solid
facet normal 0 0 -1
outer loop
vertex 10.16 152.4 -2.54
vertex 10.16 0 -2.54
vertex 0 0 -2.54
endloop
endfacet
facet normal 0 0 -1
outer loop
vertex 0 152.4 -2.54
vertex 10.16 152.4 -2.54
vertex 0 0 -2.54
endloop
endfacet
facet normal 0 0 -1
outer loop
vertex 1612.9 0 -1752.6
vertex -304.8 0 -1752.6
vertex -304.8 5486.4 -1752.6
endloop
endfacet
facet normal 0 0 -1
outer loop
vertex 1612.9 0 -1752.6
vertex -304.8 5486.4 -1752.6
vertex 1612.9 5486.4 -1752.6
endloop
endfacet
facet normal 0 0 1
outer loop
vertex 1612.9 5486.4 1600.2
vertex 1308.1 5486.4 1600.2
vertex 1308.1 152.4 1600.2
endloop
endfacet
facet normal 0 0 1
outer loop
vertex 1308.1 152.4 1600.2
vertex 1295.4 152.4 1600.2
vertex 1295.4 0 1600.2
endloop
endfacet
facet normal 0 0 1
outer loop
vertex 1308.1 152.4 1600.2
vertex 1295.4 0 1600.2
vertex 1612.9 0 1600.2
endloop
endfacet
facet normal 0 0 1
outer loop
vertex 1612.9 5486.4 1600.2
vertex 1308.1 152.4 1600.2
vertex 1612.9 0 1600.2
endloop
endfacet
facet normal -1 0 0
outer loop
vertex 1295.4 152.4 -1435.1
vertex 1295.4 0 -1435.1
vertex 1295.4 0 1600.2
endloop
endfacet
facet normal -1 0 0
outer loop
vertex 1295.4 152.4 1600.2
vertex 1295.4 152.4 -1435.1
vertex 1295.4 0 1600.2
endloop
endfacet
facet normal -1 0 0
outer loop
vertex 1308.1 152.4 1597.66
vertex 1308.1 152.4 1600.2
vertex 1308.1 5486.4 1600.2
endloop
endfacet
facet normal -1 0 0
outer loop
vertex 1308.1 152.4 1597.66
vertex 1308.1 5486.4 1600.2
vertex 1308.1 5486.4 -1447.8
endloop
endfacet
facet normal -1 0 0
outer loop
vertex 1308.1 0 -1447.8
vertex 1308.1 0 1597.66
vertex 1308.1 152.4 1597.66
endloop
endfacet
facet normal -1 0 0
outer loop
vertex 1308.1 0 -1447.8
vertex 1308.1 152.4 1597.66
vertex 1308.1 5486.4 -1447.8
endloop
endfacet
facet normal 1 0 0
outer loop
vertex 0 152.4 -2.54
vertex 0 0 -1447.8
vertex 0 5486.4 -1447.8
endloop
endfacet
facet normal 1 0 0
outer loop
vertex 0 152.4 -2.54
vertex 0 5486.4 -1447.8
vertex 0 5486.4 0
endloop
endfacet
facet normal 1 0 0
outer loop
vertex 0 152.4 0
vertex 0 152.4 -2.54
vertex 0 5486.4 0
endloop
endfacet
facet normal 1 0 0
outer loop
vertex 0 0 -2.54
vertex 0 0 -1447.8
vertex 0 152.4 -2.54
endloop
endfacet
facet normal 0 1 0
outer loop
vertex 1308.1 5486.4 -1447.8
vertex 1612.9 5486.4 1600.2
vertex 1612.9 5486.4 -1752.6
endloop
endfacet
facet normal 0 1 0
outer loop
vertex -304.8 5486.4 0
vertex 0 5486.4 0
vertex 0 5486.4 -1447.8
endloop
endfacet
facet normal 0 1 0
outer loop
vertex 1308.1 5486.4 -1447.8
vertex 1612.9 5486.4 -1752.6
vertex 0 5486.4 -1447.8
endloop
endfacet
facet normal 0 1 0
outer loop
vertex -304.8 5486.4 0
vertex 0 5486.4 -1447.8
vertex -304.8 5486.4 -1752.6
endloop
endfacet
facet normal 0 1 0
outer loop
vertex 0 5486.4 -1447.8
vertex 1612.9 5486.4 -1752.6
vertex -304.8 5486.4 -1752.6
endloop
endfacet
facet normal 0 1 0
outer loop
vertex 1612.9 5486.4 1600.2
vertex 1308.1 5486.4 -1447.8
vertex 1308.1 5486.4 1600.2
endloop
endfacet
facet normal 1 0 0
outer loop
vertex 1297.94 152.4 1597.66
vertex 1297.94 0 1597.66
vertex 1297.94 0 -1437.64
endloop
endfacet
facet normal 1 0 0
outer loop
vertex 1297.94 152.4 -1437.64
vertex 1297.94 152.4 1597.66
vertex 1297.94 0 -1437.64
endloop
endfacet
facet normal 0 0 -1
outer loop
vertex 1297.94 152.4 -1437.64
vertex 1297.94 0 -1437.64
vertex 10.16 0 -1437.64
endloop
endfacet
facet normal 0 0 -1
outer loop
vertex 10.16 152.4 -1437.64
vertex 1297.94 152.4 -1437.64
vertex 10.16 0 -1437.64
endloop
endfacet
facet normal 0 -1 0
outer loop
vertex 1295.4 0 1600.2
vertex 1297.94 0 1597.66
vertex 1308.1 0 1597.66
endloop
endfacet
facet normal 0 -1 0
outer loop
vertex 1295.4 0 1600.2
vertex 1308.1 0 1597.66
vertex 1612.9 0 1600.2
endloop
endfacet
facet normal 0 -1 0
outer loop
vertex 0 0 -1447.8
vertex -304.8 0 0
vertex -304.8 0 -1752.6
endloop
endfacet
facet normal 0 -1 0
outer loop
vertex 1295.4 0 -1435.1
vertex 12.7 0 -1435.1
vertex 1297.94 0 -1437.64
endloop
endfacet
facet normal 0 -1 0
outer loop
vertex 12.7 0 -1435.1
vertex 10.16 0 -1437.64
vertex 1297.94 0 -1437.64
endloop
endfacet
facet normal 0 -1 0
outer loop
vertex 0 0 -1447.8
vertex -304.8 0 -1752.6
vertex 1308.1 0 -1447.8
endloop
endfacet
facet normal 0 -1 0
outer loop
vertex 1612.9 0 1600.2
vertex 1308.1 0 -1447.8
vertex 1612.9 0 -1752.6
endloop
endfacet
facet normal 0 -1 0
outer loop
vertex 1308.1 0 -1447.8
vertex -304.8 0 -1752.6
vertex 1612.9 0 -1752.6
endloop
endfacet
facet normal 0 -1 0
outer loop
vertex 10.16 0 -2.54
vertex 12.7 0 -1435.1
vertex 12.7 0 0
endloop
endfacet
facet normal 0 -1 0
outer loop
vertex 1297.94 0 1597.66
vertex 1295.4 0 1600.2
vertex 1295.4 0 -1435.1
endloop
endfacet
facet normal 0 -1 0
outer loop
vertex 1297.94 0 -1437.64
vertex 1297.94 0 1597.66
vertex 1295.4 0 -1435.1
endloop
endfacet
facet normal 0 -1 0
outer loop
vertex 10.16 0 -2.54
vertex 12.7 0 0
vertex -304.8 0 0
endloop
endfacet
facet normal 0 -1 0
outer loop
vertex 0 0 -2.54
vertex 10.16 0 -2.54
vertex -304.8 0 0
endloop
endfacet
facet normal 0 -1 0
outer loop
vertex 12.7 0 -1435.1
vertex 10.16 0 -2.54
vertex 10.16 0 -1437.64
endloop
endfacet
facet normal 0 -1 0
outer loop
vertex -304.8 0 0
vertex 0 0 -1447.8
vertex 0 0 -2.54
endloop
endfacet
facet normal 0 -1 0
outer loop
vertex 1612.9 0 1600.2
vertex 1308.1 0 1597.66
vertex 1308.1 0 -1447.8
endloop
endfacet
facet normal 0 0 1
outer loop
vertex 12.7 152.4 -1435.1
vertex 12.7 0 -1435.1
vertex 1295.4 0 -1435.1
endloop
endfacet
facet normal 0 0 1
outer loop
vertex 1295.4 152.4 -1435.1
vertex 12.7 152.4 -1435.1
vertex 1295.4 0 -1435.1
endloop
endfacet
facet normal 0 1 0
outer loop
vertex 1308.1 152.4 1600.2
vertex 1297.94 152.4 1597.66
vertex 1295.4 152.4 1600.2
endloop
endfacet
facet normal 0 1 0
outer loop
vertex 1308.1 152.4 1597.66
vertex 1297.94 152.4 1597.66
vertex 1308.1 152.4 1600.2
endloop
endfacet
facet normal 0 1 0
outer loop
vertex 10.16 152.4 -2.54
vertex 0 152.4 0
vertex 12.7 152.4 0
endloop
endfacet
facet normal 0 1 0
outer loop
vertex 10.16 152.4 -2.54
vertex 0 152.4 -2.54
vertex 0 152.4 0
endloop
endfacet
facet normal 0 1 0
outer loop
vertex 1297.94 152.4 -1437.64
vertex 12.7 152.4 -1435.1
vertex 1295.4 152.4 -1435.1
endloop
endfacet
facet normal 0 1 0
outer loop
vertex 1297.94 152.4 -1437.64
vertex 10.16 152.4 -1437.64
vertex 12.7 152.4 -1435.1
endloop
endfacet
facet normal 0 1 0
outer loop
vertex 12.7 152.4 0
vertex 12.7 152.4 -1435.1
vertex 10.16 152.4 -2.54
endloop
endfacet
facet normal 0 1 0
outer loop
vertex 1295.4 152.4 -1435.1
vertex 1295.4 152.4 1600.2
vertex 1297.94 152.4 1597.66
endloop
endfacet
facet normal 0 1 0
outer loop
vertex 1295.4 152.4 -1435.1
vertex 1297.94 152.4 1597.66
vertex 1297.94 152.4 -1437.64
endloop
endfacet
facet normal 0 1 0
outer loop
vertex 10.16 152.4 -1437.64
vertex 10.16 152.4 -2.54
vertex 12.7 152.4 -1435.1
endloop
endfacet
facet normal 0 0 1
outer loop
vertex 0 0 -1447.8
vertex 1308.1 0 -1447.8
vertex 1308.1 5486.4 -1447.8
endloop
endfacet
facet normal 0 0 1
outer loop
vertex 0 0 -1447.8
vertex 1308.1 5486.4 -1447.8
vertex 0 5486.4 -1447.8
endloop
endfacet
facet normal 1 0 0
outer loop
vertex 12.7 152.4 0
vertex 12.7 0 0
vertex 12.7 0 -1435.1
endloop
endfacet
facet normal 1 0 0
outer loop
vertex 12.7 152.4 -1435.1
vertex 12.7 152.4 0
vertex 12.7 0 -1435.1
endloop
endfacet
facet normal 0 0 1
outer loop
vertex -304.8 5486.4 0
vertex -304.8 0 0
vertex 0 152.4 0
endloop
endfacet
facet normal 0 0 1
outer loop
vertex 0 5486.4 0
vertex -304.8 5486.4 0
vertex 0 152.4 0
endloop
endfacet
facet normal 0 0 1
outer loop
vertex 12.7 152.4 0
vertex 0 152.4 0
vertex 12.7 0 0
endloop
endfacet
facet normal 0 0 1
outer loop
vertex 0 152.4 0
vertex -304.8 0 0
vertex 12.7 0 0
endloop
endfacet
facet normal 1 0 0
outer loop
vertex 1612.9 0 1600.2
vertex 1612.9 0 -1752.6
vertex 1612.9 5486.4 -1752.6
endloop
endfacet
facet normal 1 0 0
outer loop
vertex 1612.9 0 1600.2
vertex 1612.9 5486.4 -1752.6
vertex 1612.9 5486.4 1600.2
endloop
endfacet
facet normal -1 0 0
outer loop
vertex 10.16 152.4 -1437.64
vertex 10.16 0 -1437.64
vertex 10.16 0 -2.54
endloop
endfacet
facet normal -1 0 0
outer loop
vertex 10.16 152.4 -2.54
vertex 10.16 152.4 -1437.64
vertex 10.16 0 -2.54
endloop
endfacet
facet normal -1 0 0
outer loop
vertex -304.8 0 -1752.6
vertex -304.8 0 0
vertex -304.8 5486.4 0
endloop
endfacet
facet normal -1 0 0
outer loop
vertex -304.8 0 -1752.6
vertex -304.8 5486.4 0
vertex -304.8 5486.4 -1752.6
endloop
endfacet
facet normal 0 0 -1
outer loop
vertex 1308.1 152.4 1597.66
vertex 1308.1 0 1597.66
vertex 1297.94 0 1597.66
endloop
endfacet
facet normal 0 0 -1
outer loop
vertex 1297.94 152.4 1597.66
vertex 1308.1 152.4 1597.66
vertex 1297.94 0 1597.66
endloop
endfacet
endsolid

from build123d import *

# Parameters (mm, degrees)
BOSS_EXTRUDE1_DEPTH = 5486.4
EXTRUDE_THIN1_DEPTH = 152.4


with BuildPart() as part:
    # Sketch1 → Boss-Extrude1 (new body)
    with BuildSketch(Plane(origin=(0, 0, 0), x_dir=(1, 0, 0), z_dir=(0, 1, 0))):
        Polygon((-304.8, 0), (-304.8, 1752.6), (1612.9, 1752.6), (1612.9, -1600.2), (1308.1, -1600.2), (1308.1, 1447.8), (0, 1447.8), (0, 0), align=None)
    extrude(amount=BOSS_EXTRUDE1_DEPTH)

    # Sketch2 → Extrude-Thin1 (add)
    with BuildSketch(Plane(origin=(0, 0, 0), x_dir=(1, 0, 0), z_dir=(0, 1, 0))):
        Polygon((0, 0), (12.7, 0), (12.7, 1435.1), (1295.4, 1435.1), (1295.4, -1600.2), (1308.1, -1600.2), (1308.1, -1597.66), (1297.94, -1597.66), (1297.94, 1437.64), (10.16, 1437.64), (10.16, 2.54), (0, 2.54), align=None)
    extrude(amount=EXTRUDE_THIN1_DEPTH)


solid = part.part
